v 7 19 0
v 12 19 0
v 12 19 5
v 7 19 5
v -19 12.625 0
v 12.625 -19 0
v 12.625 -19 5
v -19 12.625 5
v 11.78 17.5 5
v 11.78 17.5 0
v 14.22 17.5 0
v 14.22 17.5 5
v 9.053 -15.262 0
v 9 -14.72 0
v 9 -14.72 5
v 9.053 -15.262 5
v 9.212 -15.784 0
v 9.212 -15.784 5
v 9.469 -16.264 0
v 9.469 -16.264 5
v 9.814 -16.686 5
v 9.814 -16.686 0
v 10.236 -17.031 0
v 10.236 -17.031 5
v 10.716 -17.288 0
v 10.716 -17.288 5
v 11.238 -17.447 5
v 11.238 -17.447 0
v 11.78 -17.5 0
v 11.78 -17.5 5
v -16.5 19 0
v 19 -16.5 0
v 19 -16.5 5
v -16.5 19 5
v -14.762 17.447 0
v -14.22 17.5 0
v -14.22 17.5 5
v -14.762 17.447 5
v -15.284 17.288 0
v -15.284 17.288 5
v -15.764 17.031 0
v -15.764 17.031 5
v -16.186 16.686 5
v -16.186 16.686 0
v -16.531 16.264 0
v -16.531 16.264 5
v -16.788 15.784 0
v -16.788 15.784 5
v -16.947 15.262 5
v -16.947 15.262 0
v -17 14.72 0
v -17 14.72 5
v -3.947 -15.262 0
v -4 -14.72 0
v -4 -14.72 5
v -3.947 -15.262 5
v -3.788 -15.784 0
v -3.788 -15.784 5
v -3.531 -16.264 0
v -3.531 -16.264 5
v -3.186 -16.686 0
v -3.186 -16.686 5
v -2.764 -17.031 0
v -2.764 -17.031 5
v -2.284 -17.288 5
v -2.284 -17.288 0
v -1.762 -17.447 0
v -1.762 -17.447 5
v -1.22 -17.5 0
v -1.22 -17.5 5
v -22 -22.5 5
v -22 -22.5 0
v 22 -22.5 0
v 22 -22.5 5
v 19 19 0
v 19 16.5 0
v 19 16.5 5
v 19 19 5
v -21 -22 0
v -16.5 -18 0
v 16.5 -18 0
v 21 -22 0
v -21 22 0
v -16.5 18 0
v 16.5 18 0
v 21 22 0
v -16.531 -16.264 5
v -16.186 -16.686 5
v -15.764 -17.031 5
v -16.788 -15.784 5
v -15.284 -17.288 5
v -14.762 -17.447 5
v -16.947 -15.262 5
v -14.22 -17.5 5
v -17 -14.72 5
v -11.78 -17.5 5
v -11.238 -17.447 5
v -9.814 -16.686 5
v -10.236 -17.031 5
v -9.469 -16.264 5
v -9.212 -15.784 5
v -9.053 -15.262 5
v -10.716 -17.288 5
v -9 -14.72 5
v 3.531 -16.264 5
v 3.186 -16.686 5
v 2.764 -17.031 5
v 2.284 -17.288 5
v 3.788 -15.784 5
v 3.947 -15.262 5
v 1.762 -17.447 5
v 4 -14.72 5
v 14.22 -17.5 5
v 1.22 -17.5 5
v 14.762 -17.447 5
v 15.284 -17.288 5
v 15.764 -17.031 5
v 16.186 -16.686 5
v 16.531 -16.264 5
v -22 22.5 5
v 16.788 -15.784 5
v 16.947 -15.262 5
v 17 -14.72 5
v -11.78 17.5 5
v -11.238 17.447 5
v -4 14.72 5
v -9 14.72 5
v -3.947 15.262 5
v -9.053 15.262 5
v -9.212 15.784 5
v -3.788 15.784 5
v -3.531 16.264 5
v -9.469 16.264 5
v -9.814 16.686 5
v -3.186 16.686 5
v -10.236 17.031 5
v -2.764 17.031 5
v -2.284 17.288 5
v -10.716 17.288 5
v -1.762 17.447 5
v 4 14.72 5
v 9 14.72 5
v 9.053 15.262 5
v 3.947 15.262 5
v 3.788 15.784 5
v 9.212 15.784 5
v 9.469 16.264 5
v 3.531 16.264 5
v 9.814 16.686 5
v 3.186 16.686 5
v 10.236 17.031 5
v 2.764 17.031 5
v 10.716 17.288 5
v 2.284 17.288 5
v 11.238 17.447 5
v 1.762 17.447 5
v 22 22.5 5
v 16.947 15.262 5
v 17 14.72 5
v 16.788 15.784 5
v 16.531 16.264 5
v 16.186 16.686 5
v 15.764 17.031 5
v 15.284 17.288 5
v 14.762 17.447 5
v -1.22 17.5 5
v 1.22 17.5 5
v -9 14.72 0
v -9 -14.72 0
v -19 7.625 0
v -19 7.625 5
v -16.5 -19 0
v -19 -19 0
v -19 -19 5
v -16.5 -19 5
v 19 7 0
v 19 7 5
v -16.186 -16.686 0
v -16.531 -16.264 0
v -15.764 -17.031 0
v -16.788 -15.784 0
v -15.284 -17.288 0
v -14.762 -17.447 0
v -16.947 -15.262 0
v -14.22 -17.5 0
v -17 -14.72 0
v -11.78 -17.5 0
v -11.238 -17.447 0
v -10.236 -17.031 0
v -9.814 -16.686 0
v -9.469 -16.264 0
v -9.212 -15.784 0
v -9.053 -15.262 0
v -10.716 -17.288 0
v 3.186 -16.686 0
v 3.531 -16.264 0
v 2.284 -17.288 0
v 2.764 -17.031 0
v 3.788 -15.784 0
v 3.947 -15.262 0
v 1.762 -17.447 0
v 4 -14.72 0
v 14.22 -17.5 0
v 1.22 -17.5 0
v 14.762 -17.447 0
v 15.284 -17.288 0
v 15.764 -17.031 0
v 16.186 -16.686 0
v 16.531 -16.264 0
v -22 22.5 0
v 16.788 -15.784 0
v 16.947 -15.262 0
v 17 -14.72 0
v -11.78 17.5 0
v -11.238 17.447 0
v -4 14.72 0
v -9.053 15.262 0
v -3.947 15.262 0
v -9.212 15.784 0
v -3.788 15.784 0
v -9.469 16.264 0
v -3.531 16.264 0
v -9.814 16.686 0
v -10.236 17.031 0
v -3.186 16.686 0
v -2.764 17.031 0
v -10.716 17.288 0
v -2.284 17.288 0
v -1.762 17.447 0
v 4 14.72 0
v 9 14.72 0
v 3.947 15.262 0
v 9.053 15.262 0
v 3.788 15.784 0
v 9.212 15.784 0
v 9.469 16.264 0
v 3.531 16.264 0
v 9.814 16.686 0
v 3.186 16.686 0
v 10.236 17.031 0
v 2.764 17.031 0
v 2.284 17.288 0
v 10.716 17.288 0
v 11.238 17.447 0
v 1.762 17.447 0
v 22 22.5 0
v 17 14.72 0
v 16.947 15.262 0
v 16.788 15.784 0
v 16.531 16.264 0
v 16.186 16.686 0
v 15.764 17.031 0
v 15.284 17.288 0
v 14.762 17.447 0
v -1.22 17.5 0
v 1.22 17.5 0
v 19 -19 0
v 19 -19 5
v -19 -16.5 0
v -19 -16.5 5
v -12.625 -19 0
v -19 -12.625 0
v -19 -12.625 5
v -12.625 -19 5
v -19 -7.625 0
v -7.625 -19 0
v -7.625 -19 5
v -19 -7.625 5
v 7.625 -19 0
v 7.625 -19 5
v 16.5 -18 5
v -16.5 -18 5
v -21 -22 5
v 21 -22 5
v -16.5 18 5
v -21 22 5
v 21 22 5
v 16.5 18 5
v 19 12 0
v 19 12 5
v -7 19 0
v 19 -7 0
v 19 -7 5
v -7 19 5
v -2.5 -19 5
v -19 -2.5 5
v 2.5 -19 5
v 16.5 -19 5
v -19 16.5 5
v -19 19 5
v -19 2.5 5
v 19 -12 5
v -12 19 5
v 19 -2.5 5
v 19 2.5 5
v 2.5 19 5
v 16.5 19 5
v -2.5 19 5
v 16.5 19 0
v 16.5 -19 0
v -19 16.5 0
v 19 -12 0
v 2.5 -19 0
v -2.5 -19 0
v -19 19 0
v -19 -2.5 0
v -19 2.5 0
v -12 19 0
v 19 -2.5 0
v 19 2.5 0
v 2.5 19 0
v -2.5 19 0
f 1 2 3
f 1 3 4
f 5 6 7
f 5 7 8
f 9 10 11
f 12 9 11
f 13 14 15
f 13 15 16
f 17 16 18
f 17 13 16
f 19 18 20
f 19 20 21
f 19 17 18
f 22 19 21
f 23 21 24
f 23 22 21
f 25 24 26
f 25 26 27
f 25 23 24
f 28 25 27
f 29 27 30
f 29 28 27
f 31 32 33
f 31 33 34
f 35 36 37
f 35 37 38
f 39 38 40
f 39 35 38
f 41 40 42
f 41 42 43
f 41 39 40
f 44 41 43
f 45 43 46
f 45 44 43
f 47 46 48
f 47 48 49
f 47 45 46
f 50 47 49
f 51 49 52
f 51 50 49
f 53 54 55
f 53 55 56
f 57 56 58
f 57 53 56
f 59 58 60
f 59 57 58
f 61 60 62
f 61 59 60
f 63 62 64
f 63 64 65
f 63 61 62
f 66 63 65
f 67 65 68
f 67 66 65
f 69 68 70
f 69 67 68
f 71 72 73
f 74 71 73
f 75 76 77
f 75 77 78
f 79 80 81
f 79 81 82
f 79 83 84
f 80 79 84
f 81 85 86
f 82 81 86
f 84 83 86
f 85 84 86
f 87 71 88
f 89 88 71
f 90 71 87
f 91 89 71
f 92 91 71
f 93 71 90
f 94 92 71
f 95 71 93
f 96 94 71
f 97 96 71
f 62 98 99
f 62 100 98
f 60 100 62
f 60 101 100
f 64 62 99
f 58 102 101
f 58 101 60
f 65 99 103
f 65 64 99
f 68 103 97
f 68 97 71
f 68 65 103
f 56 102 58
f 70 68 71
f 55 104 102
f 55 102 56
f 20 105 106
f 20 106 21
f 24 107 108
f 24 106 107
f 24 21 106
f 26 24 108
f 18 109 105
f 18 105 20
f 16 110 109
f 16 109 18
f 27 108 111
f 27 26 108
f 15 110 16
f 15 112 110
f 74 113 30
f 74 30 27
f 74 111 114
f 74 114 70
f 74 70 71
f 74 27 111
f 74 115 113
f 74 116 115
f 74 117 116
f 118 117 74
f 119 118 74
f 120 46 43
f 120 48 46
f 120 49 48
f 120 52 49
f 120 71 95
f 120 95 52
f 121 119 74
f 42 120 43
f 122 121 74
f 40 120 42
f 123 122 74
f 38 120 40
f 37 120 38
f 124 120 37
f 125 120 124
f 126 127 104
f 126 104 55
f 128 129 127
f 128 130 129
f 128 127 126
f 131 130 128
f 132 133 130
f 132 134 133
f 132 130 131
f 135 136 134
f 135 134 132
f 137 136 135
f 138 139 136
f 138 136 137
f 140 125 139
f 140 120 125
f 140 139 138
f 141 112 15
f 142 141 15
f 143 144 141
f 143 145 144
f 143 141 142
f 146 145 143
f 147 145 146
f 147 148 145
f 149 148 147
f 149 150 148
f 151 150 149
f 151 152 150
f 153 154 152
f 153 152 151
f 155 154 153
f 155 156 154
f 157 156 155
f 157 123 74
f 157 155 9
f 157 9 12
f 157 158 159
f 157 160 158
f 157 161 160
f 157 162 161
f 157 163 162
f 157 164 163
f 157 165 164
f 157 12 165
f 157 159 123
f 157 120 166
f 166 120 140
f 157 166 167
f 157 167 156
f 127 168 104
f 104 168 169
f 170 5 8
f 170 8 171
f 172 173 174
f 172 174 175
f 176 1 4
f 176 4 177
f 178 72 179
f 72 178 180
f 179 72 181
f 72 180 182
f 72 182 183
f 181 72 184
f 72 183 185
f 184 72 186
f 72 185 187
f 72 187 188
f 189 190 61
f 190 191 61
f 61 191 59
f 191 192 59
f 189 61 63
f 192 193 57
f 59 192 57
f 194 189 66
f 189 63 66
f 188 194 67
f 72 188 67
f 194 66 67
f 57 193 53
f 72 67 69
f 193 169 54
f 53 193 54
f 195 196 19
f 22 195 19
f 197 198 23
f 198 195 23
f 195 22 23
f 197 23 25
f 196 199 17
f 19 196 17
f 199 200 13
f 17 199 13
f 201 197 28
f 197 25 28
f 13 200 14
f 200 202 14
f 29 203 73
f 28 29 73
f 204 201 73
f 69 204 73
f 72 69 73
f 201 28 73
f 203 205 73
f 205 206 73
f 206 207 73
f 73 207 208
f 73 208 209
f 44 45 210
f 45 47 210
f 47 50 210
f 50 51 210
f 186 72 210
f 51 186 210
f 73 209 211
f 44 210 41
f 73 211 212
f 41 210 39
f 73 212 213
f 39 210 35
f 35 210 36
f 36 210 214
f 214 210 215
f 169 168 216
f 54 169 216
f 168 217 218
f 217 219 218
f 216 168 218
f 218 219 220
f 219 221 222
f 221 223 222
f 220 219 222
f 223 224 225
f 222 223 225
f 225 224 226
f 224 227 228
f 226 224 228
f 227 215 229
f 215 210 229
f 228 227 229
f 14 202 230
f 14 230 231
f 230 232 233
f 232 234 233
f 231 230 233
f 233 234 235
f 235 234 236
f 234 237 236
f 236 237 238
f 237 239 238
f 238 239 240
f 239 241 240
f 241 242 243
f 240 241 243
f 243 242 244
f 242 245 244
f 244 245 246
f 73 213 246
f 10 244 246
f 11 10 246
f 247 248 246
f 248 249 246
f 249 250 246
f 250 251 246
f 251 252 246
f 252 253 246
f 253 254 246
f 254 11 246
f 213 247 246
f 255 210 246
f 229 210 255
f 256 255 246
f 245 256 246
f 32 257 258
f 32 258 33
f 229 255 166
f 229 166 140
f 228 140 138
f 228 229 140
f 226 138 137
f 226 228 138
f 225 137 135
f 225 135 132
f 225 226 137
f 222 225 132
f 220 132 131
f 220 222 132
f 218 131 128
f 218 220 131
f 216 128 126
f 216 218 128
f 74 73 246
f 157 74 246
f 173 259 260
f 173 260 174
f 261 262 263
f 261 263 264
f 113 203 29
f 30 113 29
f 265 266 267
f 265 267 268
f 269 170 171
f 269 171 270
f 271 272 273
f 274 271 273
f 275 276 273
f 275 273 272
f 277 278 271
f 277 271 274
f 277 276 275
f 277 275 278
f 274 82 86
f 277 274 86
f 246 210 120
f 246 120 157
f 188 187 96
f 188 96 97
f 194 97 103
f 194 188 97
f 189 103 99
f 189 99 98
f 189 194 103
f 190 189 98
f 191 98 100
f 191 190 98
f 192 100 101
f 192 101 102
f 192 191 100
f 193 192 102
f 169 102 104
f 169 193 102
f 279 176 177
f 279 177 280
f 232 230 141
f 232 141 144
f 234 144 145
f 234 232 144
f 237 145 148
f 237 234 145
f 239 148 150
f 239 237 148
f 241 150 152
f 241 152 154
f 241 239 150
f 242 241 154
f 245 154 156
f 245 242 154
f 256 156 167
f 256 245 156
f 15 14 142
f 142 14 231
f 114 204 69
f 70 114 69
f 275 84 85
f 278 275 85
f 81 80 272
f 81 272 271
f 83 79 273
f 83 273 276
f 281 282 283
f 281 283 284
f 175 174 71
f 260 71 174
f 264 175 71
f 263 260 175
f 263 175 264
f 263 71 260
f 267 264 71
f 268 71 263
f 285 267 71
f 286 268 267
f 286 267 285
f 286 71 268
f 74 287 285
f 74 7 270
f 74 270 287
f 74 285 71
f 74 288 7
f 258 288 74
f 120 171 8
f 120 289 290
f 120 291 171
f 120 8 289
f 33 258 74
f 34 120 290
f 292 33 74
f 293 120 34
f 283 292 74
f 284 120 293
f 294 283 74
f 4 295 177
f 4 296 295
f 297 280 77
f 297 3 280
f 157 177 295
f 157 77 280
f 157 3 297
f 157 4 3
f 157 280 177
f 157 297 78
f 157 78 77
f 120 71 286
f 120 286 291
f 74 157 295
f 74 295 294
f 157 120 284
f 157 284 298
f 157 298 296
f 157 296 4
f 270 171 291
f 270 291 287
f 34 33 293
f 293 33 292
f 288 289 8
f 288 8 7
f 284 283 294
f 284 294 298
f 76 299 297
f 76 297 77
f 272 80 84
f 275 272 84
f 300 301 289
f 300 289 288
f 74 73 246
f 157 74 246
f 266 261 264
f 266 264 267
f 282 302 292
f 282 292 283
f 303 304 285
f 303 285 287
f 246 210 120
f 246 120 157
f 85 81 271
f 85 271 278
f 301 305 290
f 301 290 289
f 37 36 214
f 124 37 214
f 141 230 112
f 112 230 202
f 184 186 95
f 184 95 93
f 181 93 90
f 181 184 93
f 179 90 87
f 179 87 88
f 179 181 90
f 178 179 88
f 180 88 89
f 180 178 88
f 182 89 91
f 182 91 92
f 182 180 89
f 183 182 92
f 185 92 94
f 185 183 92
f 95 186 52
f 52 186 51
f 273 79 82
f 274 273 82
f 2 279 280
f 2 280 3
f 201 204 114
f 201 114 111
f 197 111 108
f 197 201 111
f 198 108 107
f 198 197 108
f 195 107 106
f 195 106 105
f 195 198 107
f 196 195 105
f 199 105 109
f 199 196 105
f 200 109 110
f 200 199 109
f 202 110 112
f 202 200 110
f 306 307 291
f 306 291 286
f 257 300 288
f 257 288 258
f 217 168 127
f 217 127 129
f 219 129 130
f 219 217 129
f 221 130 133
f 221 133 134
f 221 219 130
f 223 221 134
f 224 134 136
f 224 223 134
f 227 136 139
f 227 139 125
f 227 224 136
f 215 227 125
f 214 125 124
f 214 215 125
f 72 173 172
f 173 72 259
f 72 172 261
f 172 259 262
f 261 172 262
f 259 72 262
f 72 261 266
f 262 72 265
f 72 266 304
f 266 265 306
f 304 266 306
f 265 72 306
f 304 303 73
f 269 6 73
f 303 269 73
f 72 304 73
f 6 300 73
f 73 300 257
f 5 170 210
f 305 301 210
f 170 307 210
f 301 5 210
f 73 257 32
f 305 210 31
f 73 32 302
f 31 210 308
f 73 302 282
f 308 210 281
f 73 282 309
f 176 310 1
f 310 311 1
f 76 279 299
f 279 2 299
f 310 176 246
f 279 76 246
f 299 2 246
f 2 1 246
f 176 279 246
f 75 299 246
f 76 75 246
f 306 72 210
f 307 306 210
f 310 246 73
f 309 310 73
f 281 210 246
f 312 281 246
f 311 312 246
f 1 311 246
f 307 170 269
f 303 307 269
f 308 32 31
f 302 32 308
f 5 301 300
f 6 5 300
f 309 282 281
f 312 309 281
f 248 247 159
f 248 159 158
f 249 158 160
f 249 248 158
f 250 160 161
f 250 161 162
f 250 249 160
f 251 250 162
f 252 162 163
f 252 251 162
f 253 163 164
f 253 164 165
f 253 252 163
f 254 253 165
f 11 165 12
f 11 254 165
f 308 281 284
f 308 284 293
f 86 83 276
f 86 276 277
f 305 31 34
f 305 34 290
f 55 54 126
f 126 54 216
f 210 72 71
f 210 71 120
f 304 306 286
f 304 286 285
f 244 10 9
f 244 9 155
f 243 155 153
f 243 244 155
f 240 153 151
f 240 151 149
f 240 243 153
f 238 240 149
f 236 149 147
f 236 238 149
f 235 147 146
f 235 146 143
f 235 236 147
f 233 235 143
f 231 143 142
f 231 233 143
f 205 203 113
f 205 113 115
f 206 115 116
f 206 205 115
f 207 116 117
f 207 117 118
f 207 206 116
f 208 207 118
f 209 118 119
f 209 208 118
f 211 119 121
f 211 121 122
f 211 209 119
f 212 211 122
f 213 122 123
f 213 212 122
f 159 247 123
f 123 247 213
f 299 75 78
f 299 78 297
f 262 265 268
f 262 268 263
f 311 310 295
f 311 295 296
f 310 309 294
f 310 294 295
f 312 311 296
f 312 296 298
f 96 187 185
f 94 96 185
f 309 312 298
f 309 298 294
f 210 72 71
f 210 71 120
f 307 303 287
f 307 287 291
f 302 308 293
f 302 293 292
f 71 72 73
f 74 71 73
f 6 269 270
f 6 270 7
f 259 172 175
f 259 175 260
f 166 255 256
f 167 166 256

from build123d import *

# Parameters (mm, degrees)
SKETCH_W      = 44
SKETCH_H      = 45
PAD_DEPTH     = 5
SKETCH001_W   = 44
SKETCH001_H   = 45
PAD001_DEPTH  = 5
SKETCH002_W   = 42
SKETCH002_H   = 44
SKETCH002_W_2 = 33
SKETCH002_H_2 = 36
PAD002_DEPTH  = 5


with BuildPart() as verticalholes:
    # Sketch → Pad (new body)
    with BuildSketch(Plane.XY):
        Rectangle(SKETCH_W, SKETCH_H)
        with BuildLine():
            ThreePointArc((-14.22, 17.5), (-16.185757, 16.685757), (-17, 14.72))
            Line((-17, -14.72), (-17, 14.72))
            ThreePointArc((-17, -14.72), (-16.185757, -16.685757), (-14.22, -17.5))
            Line((-11.78, -17.5), (-14.22, -17.5))
            ThreePointArc((-11.78, -17.5), (-9.814243, -16.685757), (-9, -14.72))
            Line((-9, 14.72), (-9, -14.72))
            ThreePointArc((-9, 14.72), (-9.814243, 16.685757), (-11.78, 17.5))
            Line((-14.22, 17.5), (-11.78, 17.5))
        make_face(mode=Mode.SUBTRACT)
        with BuildLine():
            ThreePointArc((-1.22, 17.5), (-3.185757, 16.685757), (-4, 14.72))
            Line((-4, -14.72), (-4, 14.72))
            ThreePointArc((-4, -14.72), (-3.185757, -16.685757), (-1.22, -17.5))
            Line((1.22, -17.5), (-1.22, -17.5))
            ThreePointArc((1.22, -17.5), (3.185757, -16.685757), (4, -14.72))
            Line((4, 14.72), (4, -14.72))
            ThreePointArc((4, 14.72), (3.185757, 16.685757), (1.22, 17.5))
            Line((-1.22, 17.5), (1.22, 17.5))
        make_face(mode=Mode.SUBTRACT)
        with BuildLine():
            ThreePointArc((11.78, 17.5), (9.814243, 16.685757), (9, 14.72))
            Line((9, -14.72), (9, 14.72))
            ThreePointArc((9, -14.72), (9.814243, -16.685757), (11.78, -17.5))
            Line((14.22, -17.5), (11.78, -17.5))
            ThreePointArc((14.22, -17.5), (16.185757, -16.685757), (17, -14.72))
            Line((17, 14.72), (17, -14.72))
            ThreePointArc((17, 14.72), (16.185757, 16.685757), (14.22, 17.5))
            Line((11.78, 17.5), (14.22, 17.5))
        make_face(mode=Mode.SUBTRACT)
    extrude(amount=PAD_DEPTH)


with BuildPart() as diagonalholes:
    # Sketch001 → Pad001 (new body)
    with BuildSketch(Plane.XY):
        Rectangle(SKETCH001_W, SKETCH001_H)
        Polygon((-19, -16.5), (-19, -19), (-16.5, -19), align=None, mode=Mode.SUBTRACT)
        Polygon((-19, -7.625), (-19, -12.625), (-12.625, -19), (-7.625, -19), align=None, mode=Mode.SUBTRACT)
        Polygon((-19, 2.5), (-19, -2.5), (-2.5, -19), (2.5, -19), align=None, mode=Mode.SUBTRACT)
        Polygon((-19, 12.625), (-19, 7.625), (7.625, -19), (12.625, -19), align=None, mode=Mode.SUBTRACT)
        Polygon((-19, 19), (-19, 16.5), (16.5, -19), (19, -19), (19, -16.5), (-16.5, 19), align=None, mode=Mode.SUBTRACT)
        Polygon((-12, 19), (19, -12), (19, -7), (-7, 19), align=None, mode=Mode.SUBTRACT)
        Polygon((-2.5, 19), (19, -2.5), (19, 2.5), (2.5, 19), align=None, mode=Mode.SUBTRACT)
        Polygon((7, 19), (19, 7), (19, 12), (12, 19), align=None, mode=Mode.SUBTRACT)
        Polygon((16.5, 19), (19, 16.5), (19, 19), align=None, mode=Mode.SUBTRACT)
    extrude(amount=PAD001_DEPTH)


with BuildPart() as fullhole:
    # Sketch002 → Pad002 (new body)
    with BuildSketch(Plane.XY):
        Rectangle(SKETCH002_W, SKETCH002_H)
        Rectangle(SKETCH002_W_2, SKETCH002_H_2, mode=Mode.SUBTRACT)
    extrude(amount=PAD002_DEPTH)


solid = Compound([verticalholes.part, diagonalholes.part, fullhole.part])
